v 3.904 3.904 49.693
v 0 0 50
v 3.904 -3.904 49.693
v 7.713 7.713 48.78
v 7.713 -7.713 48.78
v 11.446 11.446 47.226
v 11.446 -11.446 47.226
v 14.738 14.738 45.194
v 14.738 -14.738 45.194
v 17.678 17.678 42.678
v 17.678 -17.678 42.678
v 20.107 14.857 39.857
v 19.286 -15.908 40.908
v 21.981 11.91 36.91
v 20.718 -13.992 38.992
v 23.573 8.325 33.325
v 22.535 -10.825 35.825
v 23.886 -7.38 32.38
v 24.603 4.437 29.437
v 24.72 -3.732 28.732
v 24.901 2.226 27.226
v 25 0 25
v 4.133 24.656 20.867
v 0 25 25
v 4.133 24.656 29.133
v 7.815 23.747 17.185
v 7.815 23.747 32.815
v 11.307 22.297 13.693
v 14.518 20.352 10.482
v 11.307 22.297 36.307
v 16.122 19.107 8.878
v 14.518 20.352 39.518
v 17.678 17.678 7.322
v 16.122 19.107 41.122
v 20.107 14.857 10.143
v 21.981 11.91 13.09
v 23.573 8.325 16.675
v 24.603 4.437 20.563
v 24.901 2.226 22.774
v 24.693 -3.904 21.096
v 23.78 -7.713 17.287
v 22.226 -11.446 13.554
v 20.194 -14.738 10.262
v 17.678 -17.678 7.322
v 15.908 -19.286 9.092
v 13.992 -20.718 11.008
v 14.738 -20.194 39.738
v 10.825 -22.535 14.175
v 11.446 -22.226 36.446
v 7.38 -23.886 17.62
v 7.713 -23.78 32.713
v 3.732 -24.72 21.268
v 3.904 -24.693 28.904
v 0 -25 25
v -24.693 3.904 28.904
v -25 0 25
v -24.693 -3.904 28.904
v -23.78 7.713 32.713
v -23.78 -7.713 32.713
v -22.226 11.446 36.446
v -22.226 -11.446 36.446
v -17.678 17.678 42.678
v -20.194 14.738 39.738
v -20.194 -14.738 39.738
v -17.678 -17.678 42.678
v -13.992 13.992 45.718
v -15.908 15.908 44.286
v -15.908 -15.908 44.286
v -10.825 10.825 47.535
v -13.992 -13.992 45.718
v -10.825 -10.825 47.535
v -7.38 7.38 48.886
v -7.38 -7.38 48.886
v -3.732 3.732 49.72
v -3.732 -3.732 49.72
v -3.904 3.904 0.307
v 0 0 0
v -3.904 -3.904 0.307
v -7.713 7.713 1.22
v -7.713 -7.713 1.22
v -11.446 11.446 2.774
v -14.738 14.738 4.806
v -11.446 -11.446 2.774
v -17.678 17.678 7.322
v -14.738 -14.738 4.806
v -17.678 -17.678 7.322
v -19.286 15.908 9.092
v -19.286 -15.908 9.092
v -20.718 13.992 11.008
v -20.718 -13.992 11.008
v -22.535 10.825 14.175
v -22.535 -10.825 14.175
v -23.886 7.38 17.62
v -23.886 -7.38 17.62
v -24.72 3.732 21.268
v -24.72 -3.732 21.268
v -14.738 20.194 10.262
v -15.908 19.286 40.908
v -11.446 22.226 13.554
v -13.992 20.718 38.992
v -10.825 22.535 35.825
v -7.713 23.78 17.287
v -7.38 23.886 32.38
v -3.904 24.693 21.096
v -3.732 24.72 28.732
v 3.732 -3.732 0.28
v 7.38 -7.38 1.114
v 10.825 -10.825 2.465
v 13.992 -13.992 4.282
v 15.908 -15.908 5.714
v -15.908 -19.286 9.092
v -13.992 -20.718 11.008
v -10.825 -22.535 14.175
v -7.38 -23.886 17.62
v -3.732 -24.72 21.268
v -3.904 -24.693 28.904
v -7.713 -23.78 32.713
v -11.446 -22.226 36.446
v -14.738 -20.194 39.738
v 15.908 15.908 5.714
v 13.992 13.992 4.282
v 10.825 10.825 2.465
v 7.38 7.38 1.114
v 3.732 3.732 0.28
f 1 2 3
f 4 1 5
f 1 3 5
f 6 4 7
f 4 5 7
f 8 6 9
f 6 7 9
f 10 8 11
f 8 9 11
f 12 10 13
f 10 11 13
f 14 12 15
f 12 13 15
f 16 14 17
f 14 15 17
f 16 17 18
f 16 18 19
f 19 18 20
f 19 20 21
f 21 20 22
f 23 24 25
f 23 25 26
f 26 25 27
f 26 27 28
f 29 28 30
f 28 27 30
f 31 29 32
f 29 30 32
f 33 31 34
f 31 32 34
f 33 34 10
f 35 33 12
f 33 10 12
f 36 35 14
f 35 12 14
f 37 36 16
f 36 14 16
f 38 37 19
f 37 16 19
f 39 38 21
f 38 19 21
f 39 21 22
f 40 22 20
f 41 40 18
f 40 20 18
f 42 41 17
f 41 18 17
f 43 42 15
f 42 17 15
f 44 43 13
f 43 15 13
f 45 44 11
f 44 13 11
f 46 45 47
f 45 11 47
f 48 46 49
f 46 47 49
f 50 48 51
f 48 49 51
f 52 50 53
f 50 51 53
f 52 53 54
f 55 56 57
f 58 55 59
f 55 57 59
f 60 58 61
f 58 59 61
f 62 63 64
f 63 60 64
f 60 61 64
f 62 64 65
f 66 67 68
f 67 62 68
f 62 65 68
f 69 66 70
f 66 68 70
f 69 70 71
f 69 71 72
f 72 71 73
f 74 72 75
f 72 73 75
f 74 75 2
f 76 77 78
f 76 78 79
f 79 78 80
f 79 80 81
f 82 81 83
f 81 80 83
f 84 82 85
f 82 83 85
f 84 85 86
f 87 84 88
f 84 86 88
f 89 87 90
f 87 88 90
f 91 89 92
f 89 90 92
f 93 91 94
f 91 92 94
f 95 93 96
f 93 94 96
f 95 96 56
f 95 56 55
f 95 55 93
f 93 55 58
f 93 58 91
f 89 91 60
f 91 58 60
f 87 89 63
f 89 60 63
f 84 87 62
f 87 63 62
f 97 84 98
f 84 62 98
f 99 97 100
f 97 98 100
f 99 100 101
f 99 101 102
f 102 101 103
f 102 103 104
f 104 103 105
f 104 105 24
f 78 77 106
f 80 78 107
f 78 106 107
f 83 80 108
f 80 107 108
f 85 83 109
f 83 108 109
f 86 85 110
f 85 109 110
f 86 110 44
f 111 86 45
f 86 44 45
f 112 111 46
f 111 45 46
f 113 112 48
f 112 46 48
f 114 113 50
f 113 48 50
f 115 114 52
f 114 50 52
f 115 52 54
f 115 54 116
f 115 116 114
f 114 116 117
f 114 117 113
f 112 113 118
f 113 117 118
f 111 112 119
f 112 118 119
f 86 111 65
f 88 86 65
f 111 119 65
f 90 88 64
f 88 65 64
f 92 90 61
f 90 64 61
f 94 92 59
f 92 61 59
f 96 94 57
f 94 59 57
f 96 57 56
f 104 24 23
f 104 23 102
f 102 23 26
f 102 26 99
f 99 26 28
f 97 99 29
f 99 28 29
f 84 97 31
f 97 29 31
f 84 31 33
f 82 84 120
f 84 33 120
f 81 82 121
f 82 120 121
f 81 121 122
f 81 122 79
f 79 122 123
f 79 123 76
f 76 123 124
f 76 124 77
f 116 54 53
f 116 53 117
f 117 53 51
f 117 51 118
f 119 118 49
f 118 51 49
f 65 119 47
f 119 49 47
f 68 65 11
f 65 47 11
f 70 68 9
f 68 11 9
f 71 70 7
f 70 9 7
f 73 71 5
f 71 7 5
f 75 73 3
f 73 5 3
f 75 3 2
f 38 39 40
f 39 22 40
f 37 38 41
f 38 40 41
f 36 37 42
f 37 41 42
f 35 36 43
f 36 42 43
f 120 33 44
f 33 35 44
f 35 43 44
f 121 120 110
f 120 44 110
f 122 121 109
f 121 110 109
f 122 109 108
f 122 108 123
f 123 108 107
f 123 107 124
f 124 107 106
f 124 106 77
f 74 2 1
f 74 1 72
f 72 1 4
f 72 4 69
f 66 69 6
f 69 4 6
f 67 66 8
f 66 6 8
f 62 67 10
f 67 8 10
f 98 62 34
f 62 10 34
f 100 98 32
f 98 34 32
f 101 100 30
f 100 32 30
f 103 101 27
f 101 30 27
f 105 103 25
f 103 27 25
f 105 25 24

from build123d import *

# Parameters (mm, degrees)
F0_W     = 50
F0_H     = 50
F1_DEPTH = 50
F5_DEPTH = 60
F6_DEPTH = 60
F7_DEPTH = 60


with BuildPart() as f1:
    # F0 (on Top) → F1 (new body)
    with BuildSketch(Plane.XY):
        Rectangle(F0_W, F0_H)
    extrude(amount=F1_DEPTH)

    # F2 (on face) → F5 (cut)
    with BuildSketch(Plane.XZ.offset(25)):
        with BuildLine():
            ThreePointArc((2.61e-08, 50), (17.6776695389, 42.6776695204), (25, 25))
            Line((25, 25), (25, 50))
            Line((25, 50), (2.61e-08, 50))
        make_face()
        with BuildLine():
            Line((25, 0), (25, 25))
            ThreePointArc((25, 25), (17.677669509, 7.3223304497), (-5.83e-08, 0))
            Line((-5.83e-08, 0), (25, 0))
        make_face()
        with BuildLine():
            Line((-25, 0), (-5.83e-08, 0))
            ThreePointArc((-5.83e-08, 0), (-17.6776695503, 7.322330491), (-25, 25))
            Line((-25, 25), (-25, 0))
        make_face()
        with BuildLine():
            ThreePointArc((-25, 25), (-17.6776695204, 42.6776695389), (2.61e-08, 50))
            Line((2.61e-08, 50), (-25, 50))
            Line((-25, 50), (-25, 25))
        make_face()
    extrude(amount=-F5_DEPTH, mode=Mode.SUBTRACT)

    # F4 (on face) → F6 (cut)
    with BuildSketch(Plane.YZ.offset(25)):
        with BuildLine():
            ThreePointArc((-25, 25), (-17.6776695204, 42.6776695389), (2.61e-08, 50))
            Line((2.61e-08, 50), (-25, 50))
            Line((-25, 50), (-25, 25))
        make_face()
        with BuildLine():
            ThreePointArc((2.61e-08, 50), (17.6776695389, 42.6776695204), (25, 25))
            Line((25, 25), (25, 50))
            Line((25, 50), (2.61e-08, 50))
        make_face()
        with BuildLine():
            Line((25, 0), (25, 25))
            ThreePointArc((25, 25), (17.677669509, 7.3223304497), (-5.83e-08, 0))
            Line((-5.83e-08, 0), (25, 0))
        make_face()
        with BuildLine():
            Line((-25, 0), (-5.83e-08, 0))
            ThreePointArc((-5.83e-08, 0), (-17.6776695503, 7.322330491), (-25, 25))
            Line((-25, 25), (-25, 0))
        make_face()
    extrude(amount=-F6_DEPTH, mode=Mode.SUBTRACT)

    # F3 (on face) → F7 (cut)
    with BuildSketch(Plane.XY.offset(50)):
        with BuildLine():
            Line((25, -25), (25, 0))
            ThreePointArc((25, 0), (17.677669509, -17.6776695503), (-5.83e-08, -25))
            Line((-5.83e-08, -25), (25, -25))
        make_face()
        with BuildLine():
            Line((-25, -25), (-5.83e-08, -25))
            ThreePointArc((-5.83e-08, -25), (-17.6776695595, -17.6776694998), (-25, 2.61e-08))
            Line((-25, 2.61e-08), (-25, -25))
        make_face()
        with BuildLine():
            ThreePointArc((-25, 2.61e-08), (-17.6776695204, 17.6776695389), (0, 25))
            Line((0, 25), (-25, 25))
            Line((-25, 25), (-25, 2.61e-08))
        make_face()
        with BuildLine():
            ThreePointArc((0, 25), (17.6776695297, 17.6776695297), (25, 0))
            Line((25, 0), (25, 25))
            Line((25, 25), (0, 25))
        make_face()
    extrude(amount=-F7_DEPTH, mode=Mode.SUBTRACT)


solid = f1.part
